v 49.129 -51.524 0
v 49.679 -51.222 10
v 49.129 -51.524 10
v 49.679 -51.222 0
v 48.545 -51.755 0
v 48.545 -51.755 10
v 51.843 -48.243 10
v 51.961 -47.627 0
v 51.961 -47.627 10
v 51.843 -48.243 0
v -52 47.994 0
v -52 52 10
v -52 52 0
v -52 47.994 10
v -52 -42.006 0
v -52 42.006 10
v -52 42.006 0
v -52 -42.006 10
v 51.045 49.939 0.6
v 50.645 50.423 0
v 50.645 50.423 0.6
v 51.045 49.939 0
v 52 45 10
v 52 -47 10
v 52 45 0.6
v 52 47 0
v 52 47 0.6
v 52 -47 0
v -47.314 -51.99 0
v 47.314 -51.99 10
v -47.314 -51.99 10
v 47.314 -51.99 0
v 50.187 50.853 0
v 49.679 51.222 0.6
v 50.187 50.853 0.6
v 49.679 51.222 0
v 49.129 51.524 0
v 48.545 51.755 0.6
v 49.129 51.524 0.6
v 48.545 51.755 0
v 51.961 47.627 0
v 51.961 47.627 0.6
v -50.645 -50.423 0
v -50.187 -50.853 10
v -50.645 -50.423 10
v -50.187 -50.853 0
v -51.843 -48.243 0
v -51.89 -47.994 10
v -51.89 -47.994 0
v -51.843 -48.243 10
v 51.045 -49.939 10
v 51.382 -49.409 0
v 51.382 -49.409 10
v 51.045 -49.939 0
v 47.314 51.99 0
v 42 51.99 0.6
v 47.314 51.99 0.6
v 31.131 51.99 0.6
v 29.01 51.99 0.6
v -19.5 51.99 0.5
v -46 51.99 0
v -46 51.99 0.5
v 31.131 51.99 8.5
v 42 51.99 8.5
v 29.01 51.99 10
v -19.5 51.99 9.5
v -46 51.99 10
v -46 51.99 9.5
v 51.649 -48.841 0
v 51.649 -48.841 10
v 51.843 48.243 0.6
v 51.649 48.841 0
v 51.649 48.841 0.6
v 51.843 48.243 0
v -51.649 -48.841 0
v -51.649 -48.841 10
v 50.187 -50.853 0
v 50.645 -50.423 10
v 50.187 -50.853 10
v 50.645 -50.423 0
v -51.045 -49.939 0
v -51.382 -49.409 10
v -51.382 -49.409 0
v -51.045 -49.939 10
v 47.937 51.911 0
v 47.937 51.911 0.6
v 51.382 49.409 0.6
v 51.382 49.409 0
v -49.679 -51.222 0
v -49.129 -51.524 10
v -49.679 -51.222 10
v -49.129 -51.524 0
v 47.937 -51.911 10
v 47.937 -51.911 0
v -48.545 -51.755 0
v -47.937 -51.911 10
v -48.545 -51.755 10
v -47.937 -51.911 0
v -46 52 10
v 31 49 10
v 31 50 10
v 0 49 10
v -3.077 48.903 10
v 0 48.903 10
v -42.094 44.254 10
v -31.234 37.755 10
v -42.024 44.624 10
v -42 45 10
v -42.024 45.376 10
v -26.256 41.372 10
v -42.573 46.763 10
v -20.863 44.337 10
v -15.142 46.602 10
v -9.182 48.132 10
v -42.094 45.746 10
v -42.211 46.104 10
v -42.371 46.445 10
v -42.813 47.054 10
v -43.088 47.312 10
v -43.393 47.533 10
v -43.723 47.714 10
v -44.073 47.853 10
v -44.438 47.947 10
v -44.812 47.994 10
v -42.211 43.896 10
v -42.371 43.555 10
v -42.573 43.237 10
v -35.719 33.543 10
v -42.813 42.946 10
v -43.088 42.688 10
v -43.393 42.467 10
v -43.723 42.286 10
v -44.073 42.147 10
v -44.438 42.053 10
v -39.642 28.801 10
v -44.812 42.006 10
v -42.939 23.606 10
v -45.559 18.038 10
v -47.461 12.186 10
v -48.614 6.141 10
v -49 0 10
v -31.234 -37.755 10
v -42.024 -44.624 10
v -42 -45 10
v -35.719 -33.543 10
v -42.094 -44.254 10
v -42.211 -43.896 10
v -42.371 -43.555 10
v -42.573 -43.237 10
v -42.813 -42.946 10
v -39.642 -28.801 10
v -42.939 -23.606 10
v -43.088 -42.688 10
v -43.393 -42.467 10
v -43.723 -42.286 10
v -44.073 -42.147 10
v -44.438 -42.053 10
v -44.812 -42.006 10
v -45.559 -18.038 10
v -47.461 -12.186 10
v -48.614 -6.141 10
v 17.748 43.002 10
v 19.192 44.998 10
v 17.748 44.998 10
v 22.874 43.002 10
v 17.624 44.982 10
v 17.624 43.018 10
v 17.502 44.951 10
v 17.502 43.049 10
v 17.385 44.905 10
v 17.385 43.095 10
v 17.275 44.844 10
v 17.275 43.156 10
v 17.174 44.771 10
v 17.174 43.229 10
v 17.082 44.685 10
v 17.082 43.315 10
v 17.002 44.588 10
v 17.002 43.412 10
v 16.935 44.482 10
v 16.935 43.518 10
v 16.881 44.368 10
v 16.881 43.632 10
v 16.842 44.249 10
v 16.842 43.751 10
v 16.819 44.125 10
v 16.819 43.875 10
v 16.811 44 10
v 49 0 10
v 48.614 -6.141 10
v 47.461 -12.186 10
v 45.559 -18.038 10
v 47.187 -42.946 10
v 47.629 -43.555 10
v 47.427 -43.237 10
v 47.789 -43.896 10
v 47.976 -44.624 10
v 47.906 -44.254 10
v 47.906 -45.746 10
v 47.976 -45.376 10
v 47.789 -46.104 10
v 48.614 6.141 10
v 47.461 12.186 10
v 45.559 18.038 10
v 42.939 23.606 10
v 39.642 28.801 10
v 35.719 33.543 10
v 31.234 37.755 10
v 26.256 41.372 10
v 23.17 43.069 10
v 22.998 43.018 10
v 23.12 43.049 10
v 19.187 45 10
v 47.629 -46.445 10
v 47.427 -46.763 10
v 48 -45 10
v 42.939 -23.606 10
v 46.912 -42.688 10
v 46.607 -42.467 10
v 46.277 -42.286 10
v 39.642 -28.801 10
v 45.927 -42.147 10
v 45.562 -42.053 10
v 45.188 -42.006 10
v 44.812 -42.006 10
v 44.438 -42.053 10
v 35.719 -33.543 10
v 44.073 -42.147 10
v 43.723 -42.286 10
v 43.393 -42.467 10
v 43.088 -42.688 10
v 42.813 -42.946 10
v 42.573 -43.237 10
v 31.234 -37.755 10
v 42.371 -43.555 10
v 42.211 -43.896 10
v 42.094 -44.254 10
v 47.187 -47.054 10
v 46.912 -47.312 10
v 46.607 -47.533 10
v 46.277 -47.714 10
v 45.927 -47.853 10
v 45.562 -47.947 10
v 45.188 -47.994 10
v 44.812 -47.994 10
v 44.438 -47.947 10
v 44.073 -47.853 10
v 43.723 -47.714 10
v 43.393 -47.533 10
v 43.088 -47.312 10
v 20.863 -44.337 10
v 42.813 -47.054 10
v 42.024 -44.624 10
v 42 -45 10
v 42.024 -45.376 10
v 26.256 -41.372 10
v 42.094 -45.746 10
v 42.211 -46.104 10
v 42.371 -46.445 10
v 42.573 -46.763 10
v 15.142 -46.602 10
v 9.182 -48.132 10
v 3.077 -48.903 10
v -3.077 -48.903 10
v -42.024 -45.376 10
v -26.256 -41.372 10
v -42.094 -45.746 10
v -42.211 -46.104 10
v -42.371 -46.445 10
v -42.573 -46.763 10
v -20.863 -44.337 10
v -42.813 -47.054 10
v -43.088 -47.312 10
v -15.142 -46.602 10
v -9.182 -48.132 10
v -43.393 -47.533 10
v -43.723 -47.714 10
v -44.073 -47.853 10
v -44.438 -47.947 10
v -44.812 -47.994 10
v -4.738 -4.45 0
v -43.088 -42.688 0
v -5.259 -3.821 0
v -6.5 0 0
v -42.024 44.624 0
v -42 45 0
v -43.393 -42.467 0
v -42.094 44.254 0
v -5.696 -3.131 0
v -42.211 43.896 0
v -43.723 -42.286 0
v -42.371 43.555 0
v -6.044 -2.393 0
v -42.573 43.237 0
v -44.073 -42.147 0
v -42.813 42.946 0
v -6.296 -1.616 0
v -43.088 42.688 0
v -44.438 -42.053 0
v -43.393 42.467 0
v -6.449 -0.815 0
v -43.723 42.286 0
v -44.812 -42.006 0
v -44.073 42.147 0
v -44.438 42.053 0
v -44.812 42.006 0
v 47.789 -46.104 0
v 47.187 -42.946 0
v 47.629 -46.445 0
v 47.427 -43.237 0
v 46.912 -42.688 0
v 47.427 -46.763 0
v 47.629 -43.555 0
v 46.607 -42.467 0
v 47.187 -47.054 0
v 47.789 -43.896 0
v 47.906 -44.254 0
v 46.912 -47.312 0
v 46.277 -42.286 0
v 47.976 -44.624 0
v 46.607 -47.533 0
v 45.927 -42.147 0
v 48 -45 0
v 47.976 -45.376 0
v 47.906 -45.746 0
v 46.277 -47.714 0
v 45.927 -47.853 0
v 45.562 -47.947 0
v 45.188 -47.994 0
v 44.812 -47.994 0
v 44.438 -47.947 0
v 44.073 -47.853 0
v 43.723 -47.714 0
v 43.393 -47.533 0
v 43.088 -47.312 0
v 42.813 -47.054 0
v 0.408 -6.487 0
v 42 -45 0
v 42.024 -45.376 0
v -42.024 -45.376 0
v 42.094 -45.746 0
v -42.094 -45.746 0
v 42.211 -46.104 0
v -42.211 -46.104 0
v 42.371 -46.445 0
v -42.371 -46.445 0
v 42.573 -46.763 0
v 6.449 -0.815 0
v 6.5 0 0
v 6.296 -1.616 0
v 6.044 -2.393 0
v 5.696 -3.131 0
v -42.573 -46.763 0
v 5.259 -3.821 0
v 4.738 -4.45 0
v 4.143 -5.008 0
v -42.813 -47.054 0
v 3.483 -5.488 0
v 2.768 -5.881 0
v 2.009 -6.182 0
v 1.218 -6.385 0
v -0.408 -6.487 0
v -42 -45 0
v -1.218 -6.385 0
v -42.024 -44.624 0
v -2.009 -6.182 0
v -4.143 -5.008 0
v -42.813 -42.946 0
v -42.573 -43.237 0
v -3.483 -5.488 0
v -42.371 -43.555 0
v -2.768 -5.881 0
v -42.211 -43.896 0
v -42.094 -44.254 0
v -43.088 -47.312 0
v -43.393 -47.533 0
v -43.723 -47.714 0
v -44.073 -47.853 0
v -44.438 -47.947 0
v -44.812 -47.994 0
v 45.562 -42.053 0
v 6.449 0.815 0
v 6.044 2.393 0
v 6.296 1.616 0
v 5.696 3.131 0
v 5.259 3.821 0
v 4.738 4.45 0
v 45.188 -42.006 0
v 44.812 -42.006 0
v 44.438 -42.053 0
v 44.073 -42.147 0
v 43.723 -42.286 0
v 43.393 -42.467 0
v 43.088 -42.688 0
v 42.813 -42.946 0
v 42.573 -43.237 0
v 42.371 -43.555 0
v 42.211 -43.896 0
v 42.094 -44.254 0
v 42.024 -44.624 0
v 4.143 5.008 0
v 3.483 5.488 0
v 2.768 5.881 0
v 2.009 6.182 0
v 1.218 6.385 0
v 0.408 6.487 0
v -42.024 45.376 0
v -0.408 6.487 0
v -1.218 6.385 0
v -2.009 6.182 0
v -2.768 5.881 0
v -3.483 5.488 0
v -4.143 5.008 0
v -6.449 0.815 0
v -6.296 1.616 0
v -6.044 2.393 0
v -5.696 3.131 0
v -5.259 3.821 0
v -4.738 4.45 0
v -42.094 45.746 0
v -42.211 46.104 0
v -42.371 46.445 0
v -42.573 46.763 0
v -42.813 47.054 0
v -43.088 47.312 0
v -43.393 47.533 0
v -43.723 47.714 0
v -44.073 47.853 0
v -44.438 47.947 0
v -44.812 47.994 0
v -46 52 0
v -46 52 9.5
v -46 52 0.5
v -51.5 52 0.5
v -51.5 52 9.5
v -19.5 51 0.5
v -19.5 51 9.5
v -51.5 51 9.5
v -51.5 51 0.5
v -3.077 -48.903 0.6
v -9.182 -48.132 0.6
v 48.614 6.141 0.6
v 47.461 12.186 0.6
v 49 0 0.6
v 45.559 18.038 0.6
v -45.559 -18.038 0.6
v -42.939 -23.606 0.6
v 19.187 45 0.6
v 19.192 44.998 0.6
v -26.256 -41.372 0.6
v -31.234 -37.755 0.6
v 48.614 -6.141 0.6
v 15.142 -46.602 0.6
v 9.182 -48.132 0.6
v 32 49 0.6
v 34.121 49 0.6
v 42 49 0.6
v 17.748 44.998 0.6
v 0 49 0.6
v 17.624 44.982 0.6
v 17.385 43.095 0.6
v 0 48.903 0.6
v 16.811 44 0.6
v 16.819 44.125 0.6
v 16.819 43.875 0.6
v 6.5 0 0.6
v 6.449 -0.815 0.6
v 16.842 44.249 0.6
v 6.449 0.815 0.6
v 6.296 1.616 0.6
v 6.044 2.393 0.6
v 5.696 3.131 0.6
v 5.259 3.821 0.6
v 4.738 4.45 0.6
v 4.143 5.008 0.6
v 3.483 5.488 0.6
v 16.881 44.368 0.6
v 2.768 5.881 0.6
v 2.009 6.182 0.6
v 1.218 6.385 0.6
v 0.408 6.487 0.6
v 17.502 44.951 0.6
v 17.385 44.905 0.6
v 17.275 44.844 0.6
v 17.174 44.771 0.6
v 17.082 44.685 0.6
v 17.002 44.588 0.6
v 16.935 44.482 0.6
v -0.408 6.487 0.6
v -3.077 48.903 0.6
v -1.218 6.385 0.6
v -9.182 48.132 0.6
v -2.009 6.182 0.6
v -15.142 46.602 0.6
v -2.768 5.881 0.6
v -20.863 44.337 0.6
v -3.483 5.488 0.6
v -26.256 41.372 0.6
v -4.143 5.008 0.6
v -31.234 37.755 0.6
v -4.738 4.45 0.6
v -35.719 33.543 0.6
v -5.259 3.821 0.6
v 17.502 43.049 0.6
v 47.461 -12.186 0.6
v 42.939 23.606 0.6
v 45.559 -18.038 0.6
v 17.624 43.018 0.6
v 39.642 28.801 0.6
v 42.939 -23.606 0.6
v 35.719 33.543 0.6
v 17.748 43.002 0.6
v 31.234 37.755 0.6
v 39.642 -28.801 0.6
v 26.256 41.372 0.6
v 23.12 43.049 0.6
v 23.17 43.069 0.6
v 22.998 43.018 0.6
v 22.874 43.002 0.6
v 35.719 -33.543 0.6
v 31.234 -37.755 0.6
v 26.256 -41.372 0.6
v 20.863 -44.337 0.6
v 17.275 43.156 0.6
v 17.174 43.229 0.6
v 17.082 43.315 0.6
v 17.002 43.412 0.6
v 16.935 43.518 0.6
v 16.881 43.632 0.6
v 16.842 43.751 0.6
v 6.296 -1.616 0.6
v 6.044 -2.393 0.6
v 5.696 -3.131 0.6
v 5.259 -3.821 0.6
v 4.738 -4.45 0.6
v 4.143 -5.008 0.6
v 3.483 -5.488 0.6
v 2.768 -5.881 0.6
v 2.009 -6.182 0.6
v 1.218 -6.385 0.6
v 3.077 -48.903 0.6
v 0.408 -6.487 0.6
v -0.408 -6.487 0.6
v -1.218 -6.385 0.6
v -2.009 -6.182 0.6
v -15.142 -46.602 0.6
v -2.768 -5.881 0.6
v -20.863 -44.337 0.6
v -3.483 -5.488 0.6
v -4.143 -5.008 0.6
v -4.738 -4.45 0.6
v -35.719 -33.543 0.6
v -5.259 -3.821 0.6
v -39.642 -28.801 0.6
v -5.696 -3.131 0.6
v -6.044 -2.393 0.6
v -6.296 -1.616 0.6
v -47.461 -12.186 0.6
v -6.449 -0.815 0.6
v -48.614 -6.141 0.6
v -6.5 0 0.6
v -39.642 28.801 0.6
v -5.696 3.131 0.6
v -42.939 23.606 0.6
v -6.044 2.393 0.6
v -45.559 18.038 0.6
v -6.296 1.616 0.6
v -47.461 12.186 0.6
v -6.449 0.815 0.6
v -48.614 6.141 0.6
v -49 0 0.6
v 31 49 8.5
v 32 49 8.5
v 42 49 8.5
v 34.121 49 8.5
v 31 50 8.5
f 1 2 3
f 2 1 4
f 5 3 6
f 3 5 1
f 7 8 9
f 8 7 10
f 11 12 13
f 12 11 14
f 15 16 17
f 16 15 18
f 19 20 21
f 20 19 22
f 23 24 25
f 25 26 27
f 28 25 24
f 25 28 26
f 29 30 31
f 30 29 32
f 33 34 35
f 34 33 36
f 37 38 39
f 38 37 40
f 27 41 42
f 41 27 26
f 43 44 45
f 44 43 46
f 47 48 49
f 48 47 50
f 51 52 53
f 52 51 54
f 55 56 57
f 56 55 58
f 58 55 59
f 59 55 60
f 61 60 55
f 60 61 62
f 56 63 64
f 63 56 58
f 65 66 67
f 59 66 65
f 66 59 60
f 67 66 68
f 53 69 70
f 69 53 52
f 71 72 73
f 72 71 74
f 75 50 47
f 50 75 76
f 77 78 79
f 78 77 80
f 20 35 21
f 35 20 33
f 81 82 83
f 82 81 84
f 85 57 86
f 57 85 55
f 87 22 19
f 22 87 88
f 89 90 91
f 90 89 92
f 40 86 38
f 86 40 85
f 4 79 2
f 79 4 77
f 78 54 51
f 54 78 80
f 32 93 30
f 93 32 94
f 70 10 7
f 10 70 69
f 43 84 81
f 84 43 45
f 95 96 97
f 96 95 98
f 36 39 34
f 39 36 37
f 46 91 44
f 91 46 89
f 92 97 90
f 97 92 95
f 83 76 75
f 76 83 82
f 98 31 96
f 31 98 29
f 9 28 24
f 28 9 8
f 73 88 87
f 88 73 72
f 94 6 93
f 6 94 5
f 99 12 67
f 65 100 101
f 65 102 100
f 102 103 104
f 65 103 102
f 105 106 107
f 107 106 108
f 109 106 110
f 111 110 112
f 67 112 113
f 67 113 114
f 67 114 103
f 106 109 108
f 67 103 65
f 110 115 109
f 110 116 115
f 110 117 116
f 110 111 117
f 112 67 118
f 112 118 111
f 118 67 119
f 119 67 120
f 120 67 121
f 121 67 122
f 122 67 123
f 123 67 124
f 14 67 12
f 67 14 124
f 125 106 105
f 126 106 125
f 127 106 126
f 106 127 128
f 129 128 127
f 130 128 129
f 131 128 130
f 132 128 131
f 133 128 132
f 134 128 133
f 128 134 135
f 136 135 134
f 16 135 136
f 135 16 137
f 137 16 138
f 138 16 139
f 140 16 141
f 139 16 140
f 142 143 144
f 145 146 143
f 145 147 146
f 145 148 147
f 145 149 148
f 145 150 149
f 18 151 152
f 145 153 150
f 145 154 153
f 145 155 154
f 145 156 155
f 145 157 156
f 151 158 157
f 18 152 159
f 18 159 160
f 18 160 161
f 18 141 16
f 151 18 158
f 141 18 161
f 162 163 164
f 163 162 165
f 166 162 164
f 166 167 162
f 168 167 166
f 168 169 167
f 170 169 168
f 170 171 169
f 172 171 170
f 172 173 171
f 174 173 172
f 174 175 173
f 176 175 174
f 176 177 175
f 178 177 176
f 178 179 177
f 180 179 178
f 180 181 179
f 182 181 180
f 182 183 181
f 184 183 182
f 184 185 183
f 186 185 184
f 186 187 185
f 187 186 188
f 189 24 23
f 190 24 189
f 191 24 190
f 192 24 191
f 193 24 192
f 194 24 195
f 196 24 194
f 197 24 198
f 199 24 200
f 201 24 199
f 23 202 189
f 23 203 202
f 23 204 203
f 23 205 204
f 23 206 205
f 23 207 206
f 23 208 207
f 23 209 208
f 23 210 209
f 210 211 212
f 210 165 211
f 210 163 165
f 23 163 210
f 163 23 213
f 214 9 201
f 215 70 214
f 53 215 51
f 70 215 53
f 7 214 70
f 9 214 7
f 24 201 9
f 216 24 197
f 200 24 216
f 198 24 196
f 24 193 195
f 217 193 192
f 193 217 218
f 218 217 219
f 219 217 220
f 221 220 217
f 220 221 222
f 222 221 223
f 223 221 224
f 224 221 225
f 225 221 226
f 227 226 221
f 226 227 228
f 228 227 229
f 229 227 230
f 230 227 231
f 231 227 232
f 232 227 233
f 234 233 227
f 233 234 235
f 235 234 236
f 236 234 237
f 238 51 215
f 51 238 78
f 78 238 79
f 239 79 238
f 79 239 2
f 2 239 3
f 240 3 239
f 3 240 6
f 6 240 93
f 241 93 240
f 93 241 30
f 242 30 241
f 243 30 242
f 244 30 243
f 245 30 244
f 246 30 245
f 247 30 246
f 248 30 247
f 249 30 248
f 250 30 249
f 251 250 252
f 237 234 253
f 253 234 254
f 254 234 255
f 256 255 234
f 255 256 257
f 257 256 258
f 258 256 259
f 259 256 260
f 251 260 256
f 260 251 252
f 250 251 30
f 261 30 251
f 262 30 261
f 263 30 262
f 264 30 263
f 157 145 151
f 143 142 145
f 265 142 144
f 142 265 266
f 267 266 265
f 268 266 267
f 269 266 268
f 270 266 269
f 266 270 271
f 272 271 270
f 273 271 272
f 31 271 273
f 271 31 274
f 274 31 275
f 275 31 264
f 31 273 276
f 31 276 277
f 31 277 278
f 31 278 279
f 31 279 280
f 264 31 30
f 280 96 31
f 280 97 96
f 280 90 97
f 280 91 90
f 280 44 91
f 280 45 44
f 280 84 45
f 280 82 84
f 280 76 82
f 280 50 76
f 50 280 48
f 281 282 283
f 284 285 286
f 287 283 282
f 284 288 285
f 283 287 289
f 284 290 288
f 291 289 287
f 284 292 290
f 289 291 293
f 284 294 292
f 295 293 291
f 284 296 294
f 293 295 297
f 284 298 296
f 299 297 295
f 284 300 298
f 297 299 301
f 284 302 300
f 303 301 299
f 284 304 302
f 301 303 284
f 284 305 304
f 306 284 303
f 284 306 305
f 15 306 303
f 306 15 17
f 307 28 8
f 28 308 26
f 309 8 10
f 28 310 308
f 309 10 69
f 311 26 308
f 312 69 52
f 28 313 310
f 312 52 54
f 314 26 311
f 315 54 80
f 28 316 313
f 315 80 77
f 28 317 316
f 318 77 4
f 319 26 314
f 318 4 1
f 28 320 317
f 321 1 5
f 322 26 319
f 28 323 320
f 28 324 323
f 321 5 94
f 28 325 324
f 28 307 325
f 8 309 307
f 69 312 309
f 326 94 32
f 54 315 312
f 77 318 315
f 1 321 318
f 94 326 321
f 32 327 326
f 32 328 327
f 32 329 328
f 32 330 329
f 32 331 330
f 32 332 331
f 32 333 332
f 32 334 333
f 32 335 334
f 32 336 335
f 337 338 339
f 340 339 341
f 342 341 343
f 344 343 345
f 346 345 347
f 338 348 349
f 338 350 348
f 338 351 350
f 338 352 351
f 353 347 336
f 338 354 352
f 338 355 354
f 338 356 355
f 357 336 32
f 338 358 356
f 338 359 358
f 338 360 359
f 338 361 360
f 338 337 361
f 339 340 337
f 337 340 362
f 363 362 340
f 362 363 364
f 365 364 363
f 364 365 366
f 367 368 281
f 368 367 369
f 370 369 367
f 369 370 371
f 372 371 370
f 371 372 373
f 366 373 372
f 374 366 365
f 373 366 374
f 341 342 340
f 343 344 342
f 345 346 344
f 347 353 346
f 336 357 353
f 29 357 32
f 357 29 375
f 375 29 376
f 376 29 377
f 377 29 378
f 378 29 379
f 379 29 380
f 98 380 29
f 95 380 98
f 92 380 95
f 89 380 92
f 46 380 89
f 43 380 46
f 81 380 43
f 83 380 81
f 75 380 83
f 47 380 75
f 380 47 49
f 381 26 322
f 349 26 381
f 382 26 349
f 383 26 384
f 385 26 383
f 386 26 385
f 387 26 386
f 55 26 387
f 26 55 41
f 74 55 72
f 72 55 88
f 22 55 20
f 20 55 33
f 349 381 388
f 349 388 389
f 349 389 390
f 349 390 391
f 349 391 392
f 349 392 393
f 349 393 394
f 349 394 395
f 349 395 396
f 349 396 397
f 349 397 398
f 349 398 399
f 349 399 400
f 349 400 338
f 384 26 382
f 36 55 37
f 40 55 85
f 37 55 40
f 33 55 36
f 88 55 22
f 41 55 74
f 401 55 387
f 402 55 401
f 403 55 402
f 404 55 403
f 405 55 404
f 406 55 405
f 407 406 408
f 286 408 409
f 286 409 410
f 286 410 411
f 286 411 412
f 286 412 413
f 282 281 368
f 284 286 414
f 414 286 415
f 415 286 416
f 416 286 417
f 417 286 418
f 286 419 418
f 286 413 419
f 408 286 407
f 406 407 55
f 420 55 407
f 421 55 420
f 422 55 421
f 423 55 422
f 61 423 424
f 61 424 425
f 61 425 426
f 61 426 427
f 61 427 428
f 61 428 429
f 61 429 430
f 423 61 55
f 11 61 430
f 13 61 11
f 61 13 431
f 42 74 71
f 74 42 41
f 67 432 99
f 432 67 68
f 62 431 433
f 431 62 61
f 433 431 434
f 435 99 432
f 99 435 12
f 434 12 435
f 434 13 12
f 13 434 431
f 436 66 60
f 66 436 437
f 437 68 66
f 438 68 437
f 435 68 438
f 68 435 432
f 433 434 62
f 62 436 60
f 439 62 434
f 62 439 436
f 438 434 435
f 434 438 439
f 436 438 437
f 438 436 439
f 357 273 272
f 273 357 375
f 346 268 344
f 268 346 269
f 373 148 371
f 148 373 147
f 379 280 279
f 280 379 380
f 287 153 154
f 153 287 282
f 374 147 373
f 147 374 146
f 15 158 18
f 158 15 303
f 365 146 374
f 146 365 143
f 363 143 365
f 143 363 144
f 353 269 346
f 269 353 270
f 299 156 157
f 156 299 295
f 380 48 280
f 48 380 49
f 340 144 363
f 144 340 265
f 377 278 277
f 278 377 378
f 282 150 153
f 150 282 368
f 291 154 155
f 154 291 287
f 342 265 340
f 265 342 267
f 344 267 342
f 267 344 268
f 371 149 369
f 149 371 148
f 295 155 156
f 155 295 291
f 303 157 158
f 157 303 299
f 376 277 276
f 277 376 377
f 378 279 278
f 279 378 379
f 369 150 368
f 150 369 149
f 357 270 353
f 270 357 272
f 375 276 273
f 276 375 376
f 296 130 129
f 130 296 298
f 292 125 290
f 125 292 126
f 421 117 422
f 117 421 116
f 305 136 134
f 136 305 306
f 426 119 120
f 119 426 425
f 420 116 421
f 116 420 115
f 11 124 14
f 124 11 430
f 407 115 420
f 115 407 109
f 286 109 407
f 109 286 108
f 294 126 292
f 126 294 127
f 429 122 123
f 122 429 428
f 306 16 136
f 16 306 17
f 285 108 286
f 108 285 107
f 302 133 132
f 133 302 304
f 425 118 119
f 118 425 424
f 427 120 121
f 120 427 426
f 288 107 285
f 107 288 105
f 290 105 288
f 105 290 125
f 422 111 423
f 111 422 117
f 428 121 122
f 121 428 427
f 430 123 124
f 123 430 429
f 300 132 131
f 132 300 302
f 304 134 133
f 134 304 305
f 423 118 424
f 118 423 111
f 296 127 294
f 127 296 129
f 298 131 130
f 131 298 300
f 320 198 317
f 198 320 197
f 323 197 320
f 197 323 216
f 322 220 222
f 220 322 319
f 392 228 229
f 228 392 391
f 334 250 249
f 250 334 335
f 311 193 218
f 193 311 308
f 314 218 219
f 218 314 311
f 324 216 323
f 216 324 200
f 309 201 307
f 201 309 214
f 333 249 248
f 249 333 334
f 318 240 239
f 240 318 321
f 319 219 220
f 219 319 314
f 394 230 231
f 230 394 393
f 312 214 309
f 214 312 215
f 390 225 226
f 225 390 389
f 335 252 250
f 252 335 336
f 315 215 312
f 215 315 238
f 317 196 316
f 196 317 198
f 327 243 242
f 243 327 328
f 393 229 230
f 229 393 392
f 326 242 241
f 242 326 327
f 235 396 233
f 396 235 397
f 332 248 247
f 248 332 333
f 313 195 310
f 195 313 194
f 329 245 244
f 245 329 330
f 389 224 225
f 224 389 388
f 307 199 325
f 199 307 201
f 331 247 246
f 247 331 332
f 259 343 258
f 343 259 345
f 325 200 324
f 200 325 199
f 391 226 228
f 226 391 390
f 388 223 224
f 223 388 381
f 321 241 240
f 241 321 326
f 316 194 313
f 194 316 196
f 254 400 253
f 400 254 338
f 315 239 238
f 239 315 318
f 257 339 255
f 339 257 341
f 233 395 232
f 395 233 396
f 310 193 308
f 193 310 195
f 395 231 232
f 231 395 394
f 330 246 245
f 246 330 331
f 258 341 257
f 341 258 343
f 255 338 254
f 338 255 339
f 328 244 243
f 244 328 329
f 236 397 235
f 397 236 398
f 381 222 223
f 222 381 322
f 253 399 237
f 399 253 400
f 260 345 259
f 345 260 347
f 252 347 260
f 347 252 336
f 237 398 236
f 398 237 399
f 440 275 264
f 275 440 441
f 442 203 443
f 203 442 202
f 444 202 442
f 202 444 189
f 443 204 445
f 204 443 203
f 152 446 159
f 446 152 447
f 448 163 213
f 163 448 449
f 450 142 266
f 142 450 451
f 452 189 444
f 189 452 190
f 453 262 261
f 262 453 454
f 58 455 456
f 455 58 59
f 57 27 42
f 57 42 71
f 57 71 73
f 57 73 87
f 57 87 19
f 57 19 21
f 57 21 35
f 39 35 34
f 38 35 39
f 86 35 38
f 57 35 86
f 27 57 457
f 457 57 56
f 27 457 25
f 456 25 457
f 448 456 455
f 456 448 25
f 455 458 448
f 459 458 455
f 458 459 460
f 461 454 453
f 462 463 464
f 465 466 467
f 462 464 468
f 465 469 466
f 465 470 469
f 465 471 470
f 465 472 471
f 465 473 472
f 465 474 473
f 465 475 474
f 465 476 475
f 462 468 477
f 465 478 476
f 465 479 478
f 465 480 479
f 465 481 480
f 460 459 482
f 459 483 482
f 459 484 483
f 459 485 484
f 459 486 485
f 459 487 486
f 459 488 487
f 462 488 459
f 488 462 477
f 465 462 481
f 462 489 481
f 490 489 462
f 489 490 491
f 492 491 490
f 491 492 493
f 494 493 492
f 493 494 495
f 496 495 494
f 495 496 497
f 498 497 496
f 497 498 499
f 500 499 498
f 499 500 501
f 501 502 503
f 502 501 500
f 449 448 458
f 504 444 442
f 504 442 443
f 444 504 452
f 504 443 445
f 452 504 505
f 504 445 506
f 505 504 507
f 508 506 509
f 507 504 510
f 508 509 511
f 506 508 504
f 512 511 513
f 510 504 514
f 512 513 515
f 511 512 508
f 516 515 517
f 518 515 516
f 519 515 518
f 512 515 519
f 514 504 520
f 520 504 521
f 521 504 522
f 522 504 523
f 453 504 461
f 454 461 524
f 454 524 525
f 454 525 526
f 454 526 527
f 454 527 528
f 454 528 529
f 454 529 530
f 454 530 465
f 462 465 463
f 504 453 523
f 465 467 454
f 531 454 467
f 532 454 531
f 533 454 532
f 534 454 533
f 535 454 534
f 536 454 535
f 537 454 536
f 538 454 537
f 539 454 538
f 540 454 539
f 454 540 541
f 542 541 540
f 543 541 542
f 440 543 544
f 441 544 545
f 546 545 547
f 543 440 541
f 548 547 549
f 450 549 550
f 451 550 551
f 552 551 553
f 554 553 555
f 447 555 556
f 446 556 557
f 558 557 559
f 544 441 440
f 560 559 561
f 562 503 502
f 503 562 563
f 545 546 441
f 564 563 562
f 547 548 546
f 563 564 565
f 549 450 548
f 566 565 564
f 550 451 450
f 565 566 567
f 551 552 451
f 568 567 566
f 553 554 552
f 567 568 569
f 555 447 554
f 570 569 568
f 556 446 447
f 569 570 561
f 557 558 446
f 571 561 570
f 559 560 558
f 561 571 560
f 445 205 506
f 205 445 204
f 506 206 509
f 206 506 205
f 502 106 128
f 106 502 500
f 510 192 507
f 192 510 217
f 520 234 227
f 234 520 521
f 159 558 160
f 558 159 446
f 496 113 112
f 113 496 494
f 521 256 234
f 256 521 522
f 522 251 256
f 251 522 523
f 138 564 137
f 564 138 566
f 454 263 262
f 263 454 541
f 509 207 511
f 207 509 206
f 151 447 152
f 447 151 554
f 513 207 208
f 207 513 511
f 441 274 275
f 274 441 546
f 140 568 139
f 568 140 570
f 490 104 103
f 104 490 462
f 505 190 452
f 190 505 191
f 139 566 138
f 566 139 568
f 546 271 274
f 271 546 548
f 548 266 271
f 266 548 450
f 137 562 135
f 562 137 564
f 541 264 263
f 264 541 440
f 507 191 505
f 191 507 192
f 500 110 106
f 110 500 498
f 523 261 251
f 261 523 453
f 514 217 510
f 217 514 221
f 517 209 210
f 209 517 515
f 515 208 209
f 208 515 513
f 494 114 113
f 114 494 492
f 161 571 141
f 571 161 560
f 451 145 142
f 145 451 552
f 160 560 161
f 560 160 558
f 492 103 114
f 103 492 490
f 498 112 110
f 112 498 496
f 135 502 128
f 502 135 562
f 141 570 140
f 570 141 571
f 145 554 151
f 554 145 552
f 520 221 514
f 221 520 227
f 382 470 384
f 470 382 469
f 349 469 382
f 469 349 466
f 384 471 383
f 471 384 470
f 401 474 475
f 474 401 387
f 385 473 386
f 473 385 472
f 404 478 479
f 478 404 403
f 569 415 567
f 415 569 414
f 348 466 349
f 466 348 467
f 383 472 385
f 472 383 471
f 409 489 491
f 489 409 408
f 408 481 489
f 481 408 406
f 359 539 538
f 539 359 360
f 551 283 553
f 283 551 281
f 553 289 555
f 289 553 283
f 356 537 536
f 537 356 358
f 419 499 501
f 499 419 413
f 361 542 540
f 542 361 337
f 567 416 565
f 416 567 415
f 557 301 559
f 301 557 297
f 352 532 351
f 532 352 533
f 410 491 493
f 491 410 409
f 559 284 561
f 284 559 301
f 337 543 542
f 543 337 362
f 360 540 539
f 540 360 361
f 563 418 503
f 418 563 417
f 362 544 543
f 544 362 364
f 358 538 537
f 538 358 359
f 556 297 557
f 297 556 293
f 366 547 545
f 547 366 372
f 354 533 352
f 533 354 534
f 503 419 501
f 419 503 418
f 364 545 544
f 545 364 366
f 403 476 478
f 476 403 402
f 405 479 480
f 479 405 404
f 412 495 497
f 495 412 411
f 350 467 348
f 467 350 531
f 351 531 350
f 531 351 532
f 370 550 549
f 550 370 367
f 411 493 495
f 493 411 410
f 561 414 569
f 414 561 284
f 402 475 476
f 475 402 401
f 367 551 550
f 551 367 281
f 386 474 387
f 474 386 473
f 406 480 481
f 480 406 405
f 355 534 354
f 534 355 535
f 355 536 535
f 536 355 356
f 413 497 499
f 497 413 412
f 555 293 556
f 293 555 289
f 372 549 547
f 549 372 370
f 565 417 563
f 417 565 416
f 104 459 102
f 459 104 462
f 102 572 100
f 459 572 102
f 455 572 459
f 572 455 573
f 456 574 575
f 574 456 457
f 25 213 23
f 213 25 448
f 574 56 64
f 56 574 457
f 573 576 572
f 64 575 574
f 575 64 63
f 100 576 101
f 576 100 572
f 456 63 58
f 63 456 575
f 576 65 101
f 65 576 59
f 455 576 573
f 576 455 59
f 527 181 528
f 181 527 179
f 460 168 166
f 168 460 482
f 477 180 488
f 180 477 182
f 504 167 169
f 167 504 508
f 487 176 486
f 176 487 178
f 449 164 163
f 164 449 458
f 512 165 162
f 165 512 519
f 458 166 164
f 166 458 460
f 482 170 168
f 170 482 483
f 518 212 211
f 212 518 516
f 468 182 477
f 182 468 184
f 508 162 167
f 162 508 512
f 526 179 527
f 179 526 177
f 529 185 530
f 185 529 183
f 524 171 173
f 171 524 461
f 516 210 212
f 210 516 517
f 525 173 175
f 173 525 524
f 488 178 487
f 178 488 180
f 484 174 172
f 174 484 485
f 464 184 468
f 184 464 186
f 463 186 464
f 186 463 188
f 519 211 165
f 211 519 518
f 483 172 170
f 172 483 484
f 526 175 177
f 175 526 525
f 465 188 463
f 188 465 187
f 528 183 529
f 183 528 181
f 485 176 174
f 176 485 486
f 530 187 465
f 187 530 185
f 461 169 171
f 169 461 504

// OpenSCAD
$fn = 50;


union() {
	difference() {
		union() {
			translate(v = [0, 0, 0]) {
				rotate(a = [0, 0, 0]) {
					hull() {
						translate(v = [-47.0000000000, 47.0000000000, 0]) {
							rotate(a = [0, 0, 0]) {
								translate(v = [0, 0, 0]) {
									rotate(a = [0, 0, 0]) {
										cylinder(h = 10, r = 5);
									}
								}
							}
						}
						translate(v = [47.0000000000, 47.0000000000, 0]) {
							rotate(a = [0, 0, 0]) {
								translate(v = [0, 0, 0]) {
									rotate(a = [0, 0, 0]) {
										cylinder(h = 10, r = 5);
									}
								}
							}
						}
						translate(v = [-47.0000000000, -47.0000000000, 0]) {
							rotate(a = [0, 0, 0]) {
								translate(v = [0, 0, 0]) {
									rotate(a = [0, 0, 0]) {
										cylinder(h = 10, r = 5);
									}
								}
							}
						}
						translate(v = [47.0000000000, -47.0000000000, 0]) {
							rotate(a = [0, 0, 0]) {
								translate(v = [0, 0, 0]) {
									rotate(a = [0, 0, 0]) {
										cylinder(h = 10, r = 5);
									}
								}
							}
						}
					}
				}
			}
			translate(v = [-52.0000000000, 46.0000000000, 0]) {
				rotate(a = [0, 0, 0]) {
					cube(size = [6, 6, 10]);
				}
			}
		}
		union() {
			#translate(v = [-51.5000000000, 51.0000000000, 0.5000000000]) {
				rotate(a = [0, 0, 0]) {
					cube(size = [32, 1, 9.0000000000]);
				}
			}
			translate(v = [-52.5000000000, -45.0000000000, -125]) {
				rotate(a = [0, 0, 0]) {
					hull() {
						translate(v = [7.5000000000, 0, 0]) {
							rotate(a = [0, 0, 0]) {
								translate(v = [0, 0, 0]) {
									rotate(a = [0, 0, 0]) {
										cylinder(h = 250, r = 3.0000000000);
									}
								}
							}
						}
						translate(v = [-7.5000000000, 0, 0]) {
							rotate(a = [0, 0, 0]) {
								translate(v = [0, 0, 0]) {
									rotate(a = [0, 0, 0]) {
										cylinder(h = 250, r = 3.0000000000);
									}
								}
							}
						}
					}
				}
			}
			translate(v = [-52.5000000000, 45.0000000000, -125]) {
				rotate(a = [0, 0, 0]) {
					hull() {
						translate(v = [7.5000000000, 0, 0]) {
							rotate(a = [0, 0, 0]) {
								translate(v = [0, 0, 0]) {
									rotate(a = [0, 0, 0]) {
										cylinder(h = 250, r = 3.0000000000);
									}
								}
							}
						}
						translate(v = [-7.5000000000, 0, 0]) {
							rotate(a = [0, 0, 0]) {
								translate(v = [0, 0, 0]) {
									rotate(a = [0, 0, 0]) {
										cylinder(h = 250, r = 3.0000000000);
									}
								}
							}
						}
					}
				}
			}
			translate(v = [45.0000000000, -45.0000000000, -125.0000000000]) {
				rotate(a = [0, 0, 0]) {
					cylinder(h = 250, r = 3.0000000000);
				}
			}
			translate(v = [0, 0, 0.6000000000]) {
				rotate(a = [0, 0, 0]) {
					cylinder(h = 12.4000000000, r = 49.0000000000);
				}
			}
			translate(v = [0, 0, -5.0000000000]) {
				rotate(a = [0, 0, 0]) {
					cylinder(h = 10, r = 6.5000000000);
				}
			}
			translate(v = [0.0000000000, 45.0000000000, 0.6000000000]) {
				rotate(a = [0, 0, 0]) {
					cube(size = [52.0000000000, 4, 12.4000000000]);
				}
			}
			translate(v = [42.0000000000, 45.0000000000, 0.6000000000]) {
				rotate(a = [0, 0, 0]) {
					cube(size = [10, 7, 12.4000000000]);
				}
			}
			translate(v = [31.0000000000, 45.0000000000, 8.5000000000]) {
				rotate(a = [0, 0, 0]) {
					cube(size = [21, 7, 1.5000000000]);
				}
			}
			translate(v = [28.2500000000, 52.7500000000, 0.6000000000]) {
				rotate(a = [0, 0, -45]) {
					cube(size = [7.5000000000, 1.5000000000, 12.4000000000]);
				}
			}
			translate(v = [11.0610000000, 43.0000000000, 0.6000000000]) {
				rotate(a = [0, 0, 0]) {
					cube(size = [7.5000000000, 2, 9.4000000000]);
				}
			}
		}
	}
	union() {
		translate(v = [20.3110000000, 44.0000000000, 0]) {
			rotate(a = [0, 0, 0]) {
				hull() {
					translate(v = [2.5000000000, 0, 0]) {
						rotate(a = [0, 0, 0]) {
							#translate(v = [0, 0, 0]) {
								rotate(a = [0, 0, 0]) {
									cylinder(h = 10, r = 1.0000000000);
								}
							}
						}
					}
					translate(v = [-2.5000000000, 0, 0]) {
						rotate(a = [0, 0, 0]) {
							#translate(v = [0, 0, 0]) {
								rotate(a = [0, 0, 0]) {
									cylinder(h = 10, r = 1.0000000000);
								}
							}
						}
					}
				}
			}
		}
	}
}
